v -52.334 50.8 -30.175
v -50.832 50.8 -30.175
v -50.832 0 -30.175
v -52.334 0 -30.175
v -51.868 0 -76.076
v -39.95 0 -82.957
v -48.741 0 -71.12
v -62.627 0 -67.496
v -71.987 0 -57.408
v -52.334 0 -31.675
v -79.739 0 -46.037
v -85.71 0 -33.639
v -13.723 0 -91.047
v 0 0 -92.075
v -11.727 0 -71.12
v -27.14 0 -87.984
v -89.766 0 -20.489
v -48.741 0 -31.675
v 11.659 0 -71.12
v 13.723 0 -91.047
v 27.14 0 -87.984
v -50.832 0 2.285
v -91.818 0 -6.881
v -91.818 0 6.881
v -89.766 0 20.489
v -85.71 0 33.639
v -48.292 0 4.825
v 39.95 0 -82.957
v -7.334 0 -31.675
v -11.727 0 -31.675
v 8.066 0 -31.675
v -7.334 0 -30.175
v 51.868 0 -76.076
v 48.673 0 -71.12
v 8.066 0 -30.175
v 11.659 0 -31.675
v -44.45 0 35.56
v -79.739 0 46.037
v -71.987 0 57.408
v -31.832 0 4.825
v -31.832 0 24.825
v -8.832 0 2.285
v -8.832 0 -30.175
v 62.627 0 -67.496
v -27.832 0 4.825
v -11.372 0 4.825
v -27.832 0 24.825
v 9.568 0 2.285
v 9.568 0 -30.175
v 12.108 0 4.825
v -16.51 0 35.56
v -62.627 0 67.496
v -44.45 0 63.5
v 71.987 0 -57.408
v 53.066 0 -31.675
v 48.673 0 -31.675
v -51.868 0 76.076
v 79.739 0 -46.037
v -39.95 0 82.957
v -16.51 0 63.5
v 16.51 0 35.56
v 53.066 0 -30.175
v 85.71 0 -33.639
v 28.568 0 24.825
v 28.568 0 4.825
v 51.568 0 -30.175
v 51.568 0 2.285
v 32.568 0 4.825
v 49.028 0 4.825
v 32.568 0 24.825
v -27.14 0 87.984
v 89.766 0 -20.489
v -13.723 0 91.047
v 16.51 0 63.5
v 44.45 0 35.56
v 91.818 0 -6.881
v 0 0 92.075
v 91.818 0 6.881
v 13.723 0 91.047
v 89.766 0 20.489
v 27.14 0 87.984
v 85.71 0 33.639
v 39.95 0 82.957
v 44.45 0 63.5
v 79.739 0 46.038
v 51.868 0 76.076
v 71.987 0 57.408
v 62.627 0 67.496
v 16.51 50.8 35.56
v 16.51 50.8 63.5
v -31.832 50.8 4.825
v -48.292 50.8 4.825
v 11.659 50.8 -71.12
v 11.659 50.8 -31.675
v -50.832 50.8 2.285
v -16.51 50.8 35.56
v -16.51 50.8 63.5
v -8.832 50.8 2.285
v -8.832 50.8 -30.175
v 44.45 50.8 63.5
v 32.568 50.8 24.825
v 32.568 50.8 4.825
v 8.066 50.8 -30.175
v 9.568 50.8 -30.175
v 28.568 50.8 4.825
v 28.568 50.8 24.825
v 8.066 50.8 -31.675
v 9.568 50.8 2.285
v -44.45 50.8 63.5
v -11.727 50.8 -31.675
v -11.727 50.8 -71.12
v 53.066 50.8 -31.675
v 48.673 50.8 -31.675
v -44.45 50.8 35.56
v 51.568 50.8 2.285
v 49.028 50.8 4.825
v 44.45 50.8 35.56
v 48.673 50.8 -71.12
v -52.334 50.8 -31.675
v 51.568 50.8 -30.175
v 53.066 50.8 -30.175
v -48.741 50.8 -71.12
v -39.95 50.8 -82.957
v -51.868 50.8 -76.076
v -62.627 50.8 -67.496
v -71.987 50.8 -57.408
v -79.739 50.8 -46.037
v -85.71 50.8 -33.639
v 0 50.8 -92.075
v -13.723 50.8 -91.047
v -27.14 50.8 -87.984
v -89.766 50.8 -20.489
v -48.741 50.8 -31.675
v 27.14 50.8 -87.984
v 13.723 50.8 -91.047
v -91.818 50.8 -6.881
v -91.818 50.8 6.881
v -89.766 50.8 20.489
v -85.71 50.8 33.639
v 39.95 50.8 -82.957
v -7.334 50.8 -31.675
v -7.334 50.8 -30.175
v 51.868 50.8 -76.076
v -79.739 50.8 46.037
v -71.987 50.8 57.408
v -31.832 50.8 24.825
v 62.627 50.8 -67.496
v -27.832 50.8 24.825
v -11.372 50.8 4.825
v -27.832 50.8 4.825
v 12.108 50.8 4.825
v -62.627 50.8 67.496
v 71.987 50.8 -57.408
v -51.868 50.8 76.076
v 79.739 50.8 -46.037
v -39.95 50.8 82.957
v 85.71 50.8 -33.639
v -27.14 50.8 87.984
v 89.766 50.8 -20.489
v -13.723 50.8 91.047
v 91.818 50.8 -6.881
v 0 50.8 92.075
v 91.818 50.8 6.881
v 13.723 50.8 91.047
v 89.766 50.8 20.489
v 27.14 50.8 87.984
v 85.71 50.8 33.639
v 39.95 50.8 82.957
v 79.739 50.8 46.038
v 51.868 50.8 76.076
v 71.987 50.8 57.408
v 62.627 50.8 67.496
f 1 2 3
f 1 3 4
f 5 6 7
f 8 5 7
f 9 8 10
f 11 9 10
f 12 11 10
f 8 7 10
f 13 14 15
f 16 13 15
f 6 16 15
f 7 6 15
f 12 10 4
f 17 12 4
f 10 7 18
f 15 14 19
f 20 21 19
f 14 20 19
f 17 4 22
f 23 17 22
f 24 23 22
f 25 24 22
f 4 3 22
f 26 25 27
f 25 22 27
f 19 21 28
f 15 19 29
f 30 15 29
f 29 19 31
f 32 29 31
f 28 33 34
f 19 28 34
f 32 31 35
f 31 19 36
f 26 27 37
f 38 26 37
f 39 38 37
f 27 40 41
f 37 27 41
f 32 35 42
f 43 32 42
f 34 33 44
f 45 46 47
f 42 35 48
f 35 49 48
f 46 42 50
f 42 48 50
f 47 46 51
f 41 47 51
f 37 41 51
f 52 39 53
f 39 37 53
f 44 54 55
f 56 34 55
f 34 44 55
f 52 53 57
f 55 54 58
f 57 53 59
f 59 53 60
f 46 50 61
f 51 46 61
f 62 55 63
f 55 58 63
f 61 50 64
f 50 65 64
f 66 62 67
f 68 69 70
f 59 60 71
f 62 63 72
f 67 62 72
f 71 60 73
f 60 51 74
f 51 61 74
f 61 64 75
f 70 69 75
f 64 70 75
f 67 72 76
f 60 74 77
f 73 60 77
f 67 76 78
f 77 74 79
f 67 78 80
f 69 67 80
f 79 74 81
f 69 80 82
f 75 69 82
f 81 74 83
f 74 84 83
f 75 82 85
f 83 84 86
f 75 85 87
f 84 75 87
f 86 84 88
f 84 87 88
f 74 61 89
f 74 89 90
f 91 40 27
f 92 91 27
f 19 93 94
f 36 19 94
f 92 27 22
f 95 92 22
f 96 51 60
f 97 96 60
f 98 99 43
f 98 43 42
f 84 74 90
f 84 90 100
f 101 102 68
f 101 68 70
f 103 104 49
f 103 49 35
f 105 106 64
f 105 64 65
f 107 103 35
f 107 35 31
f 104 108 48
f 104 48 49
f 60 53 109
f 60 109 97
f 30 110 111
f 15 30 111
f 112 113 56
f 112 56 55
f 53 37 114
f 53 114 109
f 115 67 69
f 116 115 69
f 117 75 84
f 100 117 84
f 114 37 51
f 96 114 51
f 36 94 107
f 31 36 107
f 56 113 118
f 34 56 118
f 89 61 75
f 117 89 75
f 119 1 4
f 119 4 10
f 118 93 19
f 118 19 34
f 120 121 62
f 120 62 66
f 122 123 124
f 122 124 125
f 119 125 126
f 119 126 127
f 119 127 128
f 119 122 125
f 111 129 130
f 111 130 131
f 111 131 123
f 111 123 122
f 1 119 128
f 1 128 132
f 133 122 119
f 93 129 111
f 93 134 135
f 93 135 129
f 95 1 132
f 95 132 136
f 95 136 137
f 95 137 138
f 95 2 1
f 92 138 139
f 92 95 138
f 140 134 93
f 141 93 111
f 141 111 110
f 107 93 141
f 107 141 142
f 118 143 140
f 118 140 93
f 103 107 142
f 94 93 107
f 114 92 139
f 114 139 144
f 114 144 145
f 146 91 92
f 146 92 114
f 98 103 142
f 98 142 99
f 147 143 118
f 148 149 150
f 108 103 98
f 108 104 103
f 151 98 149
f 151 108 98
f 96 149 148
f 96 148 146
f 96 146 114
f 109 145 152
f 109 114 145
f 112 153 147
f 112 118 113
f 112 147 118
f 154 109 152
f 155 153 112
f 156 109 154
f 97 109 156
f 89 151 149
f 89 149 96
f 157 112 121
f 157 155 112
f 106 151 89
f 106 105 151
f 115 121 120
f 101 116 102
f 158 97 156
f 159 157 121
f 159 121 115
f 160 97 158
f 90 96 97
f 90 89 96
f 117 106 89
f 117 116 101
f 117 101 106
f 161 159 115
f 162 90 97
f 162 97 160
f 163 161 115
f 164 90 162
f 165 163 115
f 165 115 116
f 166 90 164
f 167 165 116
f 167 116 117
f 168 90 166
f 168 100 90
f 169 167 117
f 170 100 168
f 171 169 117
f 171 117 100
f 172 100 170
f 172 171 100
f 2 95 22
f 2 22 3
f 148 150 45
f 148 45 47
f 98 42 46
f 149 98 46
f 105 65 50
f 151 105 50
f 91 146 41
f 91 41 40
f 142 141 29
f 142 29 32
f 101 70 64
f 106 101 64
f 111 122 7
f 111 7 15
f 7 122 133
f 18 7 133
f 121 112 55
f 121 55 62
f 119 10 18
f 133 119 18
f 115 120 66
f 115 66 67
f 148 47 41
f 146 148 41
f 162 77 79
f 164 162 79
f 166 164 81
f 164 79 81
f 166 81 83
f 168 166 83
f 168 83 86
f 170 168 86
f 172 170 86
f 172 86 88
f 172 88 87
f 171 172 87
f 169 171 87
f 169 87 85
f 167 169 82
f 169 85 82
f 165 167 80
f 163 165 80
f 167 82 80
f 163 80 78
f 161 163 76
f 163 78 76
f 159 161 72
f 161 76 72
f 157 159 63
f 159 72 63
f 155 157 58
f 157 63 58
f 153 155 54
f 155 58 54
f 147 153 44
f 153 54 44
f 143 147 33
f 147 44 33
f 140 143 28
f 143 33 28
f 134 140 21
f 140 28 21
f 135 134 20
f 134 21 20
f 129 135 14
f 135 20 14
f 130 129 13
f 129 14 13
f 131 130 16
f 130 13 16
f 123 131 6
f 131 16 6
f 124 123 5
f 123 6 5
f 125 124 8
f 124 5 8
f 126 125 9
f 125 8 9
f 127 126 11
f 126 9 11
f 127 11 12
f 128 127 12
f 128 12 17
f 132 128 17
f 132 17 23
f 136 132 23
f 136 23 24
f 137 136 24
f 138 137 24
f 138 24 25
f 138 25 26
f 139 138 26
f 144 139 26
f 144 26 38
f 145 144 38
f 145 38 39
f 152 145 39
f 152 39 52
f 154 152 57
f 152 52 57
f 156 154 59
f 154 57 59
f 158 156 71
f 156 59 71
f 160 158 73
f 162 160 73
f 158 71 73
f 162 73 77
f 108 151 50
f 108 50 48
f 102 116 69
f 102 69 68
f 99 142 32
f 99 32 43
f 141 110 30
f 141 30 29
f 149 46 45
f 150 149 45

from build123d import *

# Parameters (mm, degrees)
SKETCH1_R           = 92.075
BOSS_EXTRUDE1_DEPTH = 50.8
SKETCH6_W           = 27.94
SKETCH6_H           = 27.94
CUT_EXTRUDE4_DEPTH  = 50.8
CUT_EXTRUDE5_DEPTH  = 50.8


with BuildPart() as part:
    # Sketch1 → Boss-Extrude1 (new body)
    with BuildSketch(Plane(origin=(0, 0, 0), x_dir=(1, 0, 0), z_dir=(0, 1, 0))):
        with Locations(Location((0, 0, 0), (0, 0, 270))):
            Circle(SKETCH1_R)
    extrude(amount=BOSS_EXTRUDE1_DEPTH)

    # Sketch6 → Cut-Extrude4 (cut)
    with BuildSketch(Plane.XZ):
        with Locations((30.48, 49.53)):
            Rectangle(SKETCH6_W, SKETCH6_H)
        with Locations((-30.48, 49.53)):
            Rectangle(SKETCH6_W, SKETCH6_H)
    extrude(amount=-CUT_EXTRUDE4_DEPTH, mode=Mode.SUBTRACT)

    # Sketch8 → Cut-Extrude5 (cut)
    with BuildSketch(Plane(origin=(0, 50.8, 0), x_dir=(1, 0, 0), z_dir=(0, 1, 0))):
        Polygon((48.673227998, 66.920620093), (48.673227998, 31.675), (53.066023648, 31.675), (53.066023648, 30.175), (51.568299971, 30.175), (51.568299971, -2.285), (49.028299971, -4.825), (32.568299971, -4.825), (32.568299971, -24.825), (28.568299971, -24.825), (28.568299971, -4.825), (12.108299971, -4.825), (9.568299971, -2.285), (9.568299971, 30.175), (8.06602381, 30.175), (8.06602381, 31.675), (10.838299971, 31.675), (11.658892904, 31.675), (11.658892904, 66.920620093), (11.658892904, 71.12), (48.673227998, 71.12), align=None)
        Polygon((-8.831700029, -2.285), (-11.371700029, -4.825), (-27.831700029, -4.825), (-27.831700029, -24.825), (-31.831700029, -24.825), (-31.831700029, -4.825), (-48.291700029, -4.825), (-50.831700029, -2.285), (-50.831700029, 30.175), (-52.33397619, 30.175), (-52.33397619, 31.675), (-48.741107096, 31.675), (-48.741107096, 66.920620093), (-48.741107096, 71.12), (-11.726772002, 71.12), (-11.726772002, 66.920620093), (-11.726772002, 31.675), (-7.333976352, 31.675), (-7.333976352, 30.175), (-8.831700029, 30.175), align=None)
    extrude(amount=-CUT_EXTRUDE5_DEPTH, mode=Mode.SUBTRACT)


solid = part.part
